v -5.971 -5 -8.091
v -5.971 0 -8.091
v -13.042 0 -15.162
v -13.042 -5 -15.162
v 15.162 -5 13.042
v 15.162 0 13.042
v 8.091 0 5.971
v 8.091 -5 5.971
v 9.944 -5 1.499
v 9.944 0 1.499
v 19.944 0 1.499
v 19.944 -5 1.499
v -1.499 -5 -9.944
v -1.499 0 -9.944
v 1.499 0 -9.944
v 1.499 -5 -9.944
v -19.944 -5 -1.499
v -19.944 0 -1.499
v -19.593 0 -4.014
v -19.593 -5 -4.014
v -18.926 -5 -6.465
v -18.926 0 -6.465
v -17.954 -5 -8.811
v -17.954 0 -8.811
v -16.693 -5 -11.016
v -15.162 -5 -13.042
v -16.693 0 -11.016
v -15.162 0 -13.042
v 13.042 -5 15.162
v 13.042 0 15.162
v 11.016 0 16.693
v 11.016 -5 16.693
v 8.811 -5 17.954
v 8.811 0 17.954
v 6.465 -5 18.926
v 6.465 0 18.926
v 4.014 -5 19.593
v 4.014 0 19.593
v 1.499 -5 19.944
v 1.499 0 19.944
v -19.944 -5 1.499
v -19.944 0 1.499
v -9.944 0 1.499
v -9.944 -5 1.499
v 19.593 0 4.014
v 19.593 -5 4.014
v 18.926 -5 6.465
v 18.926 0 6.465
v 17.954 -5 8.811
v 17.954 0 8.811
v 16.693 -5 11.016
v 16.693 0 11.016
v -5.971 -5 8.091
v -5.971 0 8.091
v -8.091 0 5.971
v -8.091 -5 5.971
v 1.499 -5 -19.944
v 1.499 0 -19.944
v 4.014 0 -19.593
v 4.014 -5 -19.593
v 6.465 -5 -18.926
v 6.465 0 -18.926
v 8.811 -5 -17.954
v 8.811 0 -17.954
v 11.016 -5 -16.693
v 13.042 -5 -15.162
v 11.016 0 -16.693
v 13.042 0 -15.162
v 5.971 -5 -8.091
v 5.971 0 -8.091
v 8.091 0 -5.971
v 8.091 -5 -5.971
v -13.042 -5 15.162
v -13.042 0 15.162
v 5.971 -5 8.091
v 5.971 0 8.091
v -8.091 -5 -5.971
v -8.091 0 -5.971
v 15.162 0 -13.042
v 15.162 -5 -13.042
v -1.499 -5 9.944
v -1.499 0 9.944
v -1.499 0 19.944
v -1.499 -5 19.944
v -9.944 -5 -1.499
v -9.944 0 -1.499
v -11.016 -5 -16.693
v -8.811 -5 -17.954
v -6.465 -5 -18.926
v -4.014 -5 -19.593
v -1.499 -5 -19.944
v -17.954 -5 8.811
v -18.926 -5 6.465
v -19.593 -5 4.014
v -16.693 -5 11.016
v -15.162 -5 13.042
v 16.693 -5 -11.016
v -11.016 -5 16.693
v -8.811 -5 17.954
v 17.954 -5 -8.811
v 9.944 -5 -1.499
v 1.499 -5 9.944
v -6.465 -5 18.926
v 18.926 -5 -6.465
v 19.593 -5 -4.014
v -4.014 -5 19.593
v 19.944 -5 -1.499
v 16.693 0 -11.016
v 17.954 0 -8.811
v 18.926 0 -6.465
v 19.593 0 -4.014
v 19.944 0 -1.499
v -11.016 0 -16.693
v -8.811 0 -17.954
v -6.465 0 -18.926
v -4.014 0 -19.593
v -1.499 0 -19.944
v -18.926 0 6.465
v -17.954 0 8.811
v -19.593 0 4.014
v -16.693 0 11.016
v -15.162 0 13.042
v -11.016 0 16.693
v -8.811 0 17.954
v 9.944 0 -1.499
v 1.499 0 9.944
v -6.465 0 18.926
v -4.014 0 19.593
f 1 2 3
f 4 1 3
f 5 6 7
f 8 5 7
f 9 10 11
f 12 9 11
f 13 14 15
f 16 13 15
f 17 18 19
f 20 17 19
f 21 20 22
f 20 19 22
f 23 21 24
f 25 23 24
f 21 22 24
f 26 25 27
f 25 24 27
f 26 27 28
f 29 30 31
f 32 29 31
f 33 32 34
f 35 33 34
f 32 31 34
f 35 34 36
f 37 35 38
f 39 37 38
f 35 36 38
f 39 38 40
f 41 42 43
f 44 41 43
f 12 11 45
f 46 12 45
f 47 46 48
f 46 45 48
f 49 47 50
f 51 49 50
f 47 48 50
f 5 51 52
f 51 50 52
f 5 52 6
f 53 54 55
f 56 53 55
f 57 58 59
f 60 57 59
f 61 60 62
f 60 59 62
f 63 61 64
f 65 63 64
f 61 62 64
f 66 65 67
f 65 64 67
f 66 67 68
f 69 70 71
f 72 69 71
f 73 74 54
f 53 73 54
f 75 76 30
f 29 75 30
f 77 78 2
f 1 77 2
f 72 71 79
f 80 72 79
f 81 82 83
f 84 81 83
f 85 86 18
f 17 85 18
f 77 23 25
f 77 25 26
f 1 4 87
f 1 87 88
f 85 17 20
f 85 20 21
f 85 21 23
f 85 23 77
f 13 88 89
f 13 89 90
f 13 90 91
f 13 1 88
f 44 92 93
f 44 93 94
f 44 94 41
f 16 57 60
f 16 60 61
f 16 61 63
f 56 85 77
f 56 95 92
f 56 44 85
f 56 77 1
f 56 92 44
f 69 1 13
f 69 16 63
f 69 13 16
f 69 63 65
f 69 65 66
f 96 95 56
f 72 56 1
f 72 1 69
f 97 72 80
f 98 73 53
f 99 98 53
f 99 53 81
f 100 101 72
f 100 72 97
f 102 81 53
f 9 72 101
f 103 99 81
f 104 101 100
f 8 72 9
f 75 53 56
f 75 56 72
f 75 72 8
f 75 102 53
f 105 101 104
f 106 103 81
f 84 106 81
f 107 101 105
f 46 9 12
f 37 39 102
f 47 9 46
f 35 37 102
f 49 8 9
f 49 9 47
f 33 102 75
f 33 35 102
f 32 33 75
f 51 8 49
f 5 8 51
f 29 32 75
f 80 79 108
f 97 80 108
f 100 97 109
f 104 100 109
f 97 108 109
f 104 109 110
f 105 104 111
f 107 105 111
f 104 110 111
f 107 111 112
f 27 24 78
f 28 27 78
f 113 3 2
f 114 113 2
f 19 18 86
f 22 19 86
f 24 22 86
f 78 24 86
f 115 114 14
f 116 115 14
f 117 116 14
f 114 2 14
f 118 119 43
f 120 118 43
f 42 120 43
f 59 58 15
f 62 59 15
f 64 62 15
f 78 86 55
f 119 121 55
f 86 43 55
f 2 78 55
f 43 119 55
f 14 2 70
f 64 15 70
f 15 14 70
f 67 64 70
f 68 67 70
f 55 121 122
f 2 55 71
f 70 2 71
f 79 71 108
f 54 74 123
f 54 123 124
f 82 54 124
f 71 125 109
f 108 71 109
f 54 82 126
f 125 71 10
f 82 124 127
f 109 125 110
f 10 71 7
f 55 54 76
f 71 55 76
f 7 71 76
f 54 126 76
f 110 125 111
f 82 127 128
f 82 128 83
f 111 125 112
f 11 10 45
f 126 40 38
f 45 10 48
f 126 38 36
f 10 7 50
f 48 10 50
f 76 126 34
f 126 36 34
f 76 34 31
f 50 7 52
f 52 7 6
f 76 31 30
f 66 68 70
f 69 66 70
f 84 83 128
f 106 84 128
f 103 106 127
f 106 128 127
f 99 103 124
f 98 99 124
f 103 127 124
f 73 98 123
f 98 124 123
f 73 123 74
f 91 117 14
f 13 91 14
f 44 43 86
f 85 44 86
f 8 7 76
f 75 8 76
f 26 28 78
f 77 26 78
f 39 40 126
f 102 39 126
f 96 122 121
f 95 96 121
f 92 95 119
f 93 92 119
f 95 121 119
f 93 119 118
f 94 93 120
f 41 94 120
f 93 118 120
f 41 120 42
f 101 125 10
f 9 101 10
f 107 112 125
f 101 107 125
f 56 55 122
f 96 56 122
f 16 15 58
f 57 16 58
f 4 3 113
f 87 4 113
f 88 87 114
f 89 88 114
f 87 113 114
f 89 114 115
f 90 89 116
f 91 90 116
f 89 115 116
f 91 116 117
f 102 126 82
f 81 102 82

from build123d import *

# Parameters (mm, degrees)
F1_DEPTH = 5


with BuildPart() as f1:
    # F0 (on Front) → F1 (new body)
    with BuildSketch(Plane.XZ):
        with BuildLine():
            Line((-1.498945, 9.94375), (-1.498945, 19.94375))
            ThreePointArc((-1.498945, 19.94375), (-7.653669, 18.477591), (-13.042447, 15.162275))
            Line((-13.042447, 15.162275), (-5.971379, 8.091207))
            Line((-5.971379, 8.091207), (-8.091207, 5.971379))
            Line((-8.091207, 5.971379), (-15.162275, 13.042447))
            ThreePointArc((-15.162275, 13.042447), (-18.477591, 7.653669), (-19.94375, 1.498945))
            Line((-19.94375, 1.498945), (-9.94375, 1.498945))
            Line((-9.94375, 1.498945), (-9.94375, -1.498945))
            Line((-9.94375, -1.498945), (-19.94375, -1.498945))
            ThreePointArc((-19.94375, -1.498945), (-18.477591, -7.653669), (-15.162275, -13.042447))
            Line((-15.162275, -13.042447), (-8.091207, -5.971379))
            Line((-8.091207, -5.971379), (-5.971379, -8.091207))
            Line((-5.971379, -8.091207), (-13.042447, -15.162275))
            ThreePointArc((-13.042447, -15.162275), (-7.653669, -18.477591), (-1.498945, -19.94375))
            Line((-1.498945, -19.94375), (-1.498945, -9.94375))
            Line((-1.498945, -9.94375), (1.498945, -9.94375))
            Line((1.498945, -9.94375), (1.498945, -19.94375))
            ThreePointArc((1.498945, -19.94375), (7.653669, -18.477591), (13.042447, -15.162275))
            Line((13.042447, -15.162275), (5.971379, -8.091207))
            Line((5.971379, -8.091207), (8.091207, -5.971379))
            Line((8.091207, -5.971379), (15.162275, -13.042447))
            ThreePointArc((15.162275, -13.042447), (18.477591, -7.653669), (19.94375, -1.498945))
            Line((19.94375, -1.498945), (9.94375, -1.498945))
            Line((9.94375, -1.498945), (9.94375, 1.498945))
            Line((9.94375, 1.498945), (19.94375, 1.498945))
            ThreePointArc((19.94375, 1.498945), (18.477591, 7.653669), (15.162275, 13.042447))
            Line((15.162275, 13.042447), (8.091207, 5.971379))
            Line((8.091207, 5.971379), (5.971379, 8.091207))
            Line((5.971379, 8.091207), (13.042447, 15.162275))
            ThreePointArc((13.042447, 15.162275), (7.653669, 18.477591), (1.498945, 19.94375))
            Line((1.498945, 19.94375), (1.498945, 9.94375))
            Line((1.498945, 9.94375), (-1.498945, 9.94375))
        make_face()
    extrude(amount=F1_DEPTH)


solid = f1.part
